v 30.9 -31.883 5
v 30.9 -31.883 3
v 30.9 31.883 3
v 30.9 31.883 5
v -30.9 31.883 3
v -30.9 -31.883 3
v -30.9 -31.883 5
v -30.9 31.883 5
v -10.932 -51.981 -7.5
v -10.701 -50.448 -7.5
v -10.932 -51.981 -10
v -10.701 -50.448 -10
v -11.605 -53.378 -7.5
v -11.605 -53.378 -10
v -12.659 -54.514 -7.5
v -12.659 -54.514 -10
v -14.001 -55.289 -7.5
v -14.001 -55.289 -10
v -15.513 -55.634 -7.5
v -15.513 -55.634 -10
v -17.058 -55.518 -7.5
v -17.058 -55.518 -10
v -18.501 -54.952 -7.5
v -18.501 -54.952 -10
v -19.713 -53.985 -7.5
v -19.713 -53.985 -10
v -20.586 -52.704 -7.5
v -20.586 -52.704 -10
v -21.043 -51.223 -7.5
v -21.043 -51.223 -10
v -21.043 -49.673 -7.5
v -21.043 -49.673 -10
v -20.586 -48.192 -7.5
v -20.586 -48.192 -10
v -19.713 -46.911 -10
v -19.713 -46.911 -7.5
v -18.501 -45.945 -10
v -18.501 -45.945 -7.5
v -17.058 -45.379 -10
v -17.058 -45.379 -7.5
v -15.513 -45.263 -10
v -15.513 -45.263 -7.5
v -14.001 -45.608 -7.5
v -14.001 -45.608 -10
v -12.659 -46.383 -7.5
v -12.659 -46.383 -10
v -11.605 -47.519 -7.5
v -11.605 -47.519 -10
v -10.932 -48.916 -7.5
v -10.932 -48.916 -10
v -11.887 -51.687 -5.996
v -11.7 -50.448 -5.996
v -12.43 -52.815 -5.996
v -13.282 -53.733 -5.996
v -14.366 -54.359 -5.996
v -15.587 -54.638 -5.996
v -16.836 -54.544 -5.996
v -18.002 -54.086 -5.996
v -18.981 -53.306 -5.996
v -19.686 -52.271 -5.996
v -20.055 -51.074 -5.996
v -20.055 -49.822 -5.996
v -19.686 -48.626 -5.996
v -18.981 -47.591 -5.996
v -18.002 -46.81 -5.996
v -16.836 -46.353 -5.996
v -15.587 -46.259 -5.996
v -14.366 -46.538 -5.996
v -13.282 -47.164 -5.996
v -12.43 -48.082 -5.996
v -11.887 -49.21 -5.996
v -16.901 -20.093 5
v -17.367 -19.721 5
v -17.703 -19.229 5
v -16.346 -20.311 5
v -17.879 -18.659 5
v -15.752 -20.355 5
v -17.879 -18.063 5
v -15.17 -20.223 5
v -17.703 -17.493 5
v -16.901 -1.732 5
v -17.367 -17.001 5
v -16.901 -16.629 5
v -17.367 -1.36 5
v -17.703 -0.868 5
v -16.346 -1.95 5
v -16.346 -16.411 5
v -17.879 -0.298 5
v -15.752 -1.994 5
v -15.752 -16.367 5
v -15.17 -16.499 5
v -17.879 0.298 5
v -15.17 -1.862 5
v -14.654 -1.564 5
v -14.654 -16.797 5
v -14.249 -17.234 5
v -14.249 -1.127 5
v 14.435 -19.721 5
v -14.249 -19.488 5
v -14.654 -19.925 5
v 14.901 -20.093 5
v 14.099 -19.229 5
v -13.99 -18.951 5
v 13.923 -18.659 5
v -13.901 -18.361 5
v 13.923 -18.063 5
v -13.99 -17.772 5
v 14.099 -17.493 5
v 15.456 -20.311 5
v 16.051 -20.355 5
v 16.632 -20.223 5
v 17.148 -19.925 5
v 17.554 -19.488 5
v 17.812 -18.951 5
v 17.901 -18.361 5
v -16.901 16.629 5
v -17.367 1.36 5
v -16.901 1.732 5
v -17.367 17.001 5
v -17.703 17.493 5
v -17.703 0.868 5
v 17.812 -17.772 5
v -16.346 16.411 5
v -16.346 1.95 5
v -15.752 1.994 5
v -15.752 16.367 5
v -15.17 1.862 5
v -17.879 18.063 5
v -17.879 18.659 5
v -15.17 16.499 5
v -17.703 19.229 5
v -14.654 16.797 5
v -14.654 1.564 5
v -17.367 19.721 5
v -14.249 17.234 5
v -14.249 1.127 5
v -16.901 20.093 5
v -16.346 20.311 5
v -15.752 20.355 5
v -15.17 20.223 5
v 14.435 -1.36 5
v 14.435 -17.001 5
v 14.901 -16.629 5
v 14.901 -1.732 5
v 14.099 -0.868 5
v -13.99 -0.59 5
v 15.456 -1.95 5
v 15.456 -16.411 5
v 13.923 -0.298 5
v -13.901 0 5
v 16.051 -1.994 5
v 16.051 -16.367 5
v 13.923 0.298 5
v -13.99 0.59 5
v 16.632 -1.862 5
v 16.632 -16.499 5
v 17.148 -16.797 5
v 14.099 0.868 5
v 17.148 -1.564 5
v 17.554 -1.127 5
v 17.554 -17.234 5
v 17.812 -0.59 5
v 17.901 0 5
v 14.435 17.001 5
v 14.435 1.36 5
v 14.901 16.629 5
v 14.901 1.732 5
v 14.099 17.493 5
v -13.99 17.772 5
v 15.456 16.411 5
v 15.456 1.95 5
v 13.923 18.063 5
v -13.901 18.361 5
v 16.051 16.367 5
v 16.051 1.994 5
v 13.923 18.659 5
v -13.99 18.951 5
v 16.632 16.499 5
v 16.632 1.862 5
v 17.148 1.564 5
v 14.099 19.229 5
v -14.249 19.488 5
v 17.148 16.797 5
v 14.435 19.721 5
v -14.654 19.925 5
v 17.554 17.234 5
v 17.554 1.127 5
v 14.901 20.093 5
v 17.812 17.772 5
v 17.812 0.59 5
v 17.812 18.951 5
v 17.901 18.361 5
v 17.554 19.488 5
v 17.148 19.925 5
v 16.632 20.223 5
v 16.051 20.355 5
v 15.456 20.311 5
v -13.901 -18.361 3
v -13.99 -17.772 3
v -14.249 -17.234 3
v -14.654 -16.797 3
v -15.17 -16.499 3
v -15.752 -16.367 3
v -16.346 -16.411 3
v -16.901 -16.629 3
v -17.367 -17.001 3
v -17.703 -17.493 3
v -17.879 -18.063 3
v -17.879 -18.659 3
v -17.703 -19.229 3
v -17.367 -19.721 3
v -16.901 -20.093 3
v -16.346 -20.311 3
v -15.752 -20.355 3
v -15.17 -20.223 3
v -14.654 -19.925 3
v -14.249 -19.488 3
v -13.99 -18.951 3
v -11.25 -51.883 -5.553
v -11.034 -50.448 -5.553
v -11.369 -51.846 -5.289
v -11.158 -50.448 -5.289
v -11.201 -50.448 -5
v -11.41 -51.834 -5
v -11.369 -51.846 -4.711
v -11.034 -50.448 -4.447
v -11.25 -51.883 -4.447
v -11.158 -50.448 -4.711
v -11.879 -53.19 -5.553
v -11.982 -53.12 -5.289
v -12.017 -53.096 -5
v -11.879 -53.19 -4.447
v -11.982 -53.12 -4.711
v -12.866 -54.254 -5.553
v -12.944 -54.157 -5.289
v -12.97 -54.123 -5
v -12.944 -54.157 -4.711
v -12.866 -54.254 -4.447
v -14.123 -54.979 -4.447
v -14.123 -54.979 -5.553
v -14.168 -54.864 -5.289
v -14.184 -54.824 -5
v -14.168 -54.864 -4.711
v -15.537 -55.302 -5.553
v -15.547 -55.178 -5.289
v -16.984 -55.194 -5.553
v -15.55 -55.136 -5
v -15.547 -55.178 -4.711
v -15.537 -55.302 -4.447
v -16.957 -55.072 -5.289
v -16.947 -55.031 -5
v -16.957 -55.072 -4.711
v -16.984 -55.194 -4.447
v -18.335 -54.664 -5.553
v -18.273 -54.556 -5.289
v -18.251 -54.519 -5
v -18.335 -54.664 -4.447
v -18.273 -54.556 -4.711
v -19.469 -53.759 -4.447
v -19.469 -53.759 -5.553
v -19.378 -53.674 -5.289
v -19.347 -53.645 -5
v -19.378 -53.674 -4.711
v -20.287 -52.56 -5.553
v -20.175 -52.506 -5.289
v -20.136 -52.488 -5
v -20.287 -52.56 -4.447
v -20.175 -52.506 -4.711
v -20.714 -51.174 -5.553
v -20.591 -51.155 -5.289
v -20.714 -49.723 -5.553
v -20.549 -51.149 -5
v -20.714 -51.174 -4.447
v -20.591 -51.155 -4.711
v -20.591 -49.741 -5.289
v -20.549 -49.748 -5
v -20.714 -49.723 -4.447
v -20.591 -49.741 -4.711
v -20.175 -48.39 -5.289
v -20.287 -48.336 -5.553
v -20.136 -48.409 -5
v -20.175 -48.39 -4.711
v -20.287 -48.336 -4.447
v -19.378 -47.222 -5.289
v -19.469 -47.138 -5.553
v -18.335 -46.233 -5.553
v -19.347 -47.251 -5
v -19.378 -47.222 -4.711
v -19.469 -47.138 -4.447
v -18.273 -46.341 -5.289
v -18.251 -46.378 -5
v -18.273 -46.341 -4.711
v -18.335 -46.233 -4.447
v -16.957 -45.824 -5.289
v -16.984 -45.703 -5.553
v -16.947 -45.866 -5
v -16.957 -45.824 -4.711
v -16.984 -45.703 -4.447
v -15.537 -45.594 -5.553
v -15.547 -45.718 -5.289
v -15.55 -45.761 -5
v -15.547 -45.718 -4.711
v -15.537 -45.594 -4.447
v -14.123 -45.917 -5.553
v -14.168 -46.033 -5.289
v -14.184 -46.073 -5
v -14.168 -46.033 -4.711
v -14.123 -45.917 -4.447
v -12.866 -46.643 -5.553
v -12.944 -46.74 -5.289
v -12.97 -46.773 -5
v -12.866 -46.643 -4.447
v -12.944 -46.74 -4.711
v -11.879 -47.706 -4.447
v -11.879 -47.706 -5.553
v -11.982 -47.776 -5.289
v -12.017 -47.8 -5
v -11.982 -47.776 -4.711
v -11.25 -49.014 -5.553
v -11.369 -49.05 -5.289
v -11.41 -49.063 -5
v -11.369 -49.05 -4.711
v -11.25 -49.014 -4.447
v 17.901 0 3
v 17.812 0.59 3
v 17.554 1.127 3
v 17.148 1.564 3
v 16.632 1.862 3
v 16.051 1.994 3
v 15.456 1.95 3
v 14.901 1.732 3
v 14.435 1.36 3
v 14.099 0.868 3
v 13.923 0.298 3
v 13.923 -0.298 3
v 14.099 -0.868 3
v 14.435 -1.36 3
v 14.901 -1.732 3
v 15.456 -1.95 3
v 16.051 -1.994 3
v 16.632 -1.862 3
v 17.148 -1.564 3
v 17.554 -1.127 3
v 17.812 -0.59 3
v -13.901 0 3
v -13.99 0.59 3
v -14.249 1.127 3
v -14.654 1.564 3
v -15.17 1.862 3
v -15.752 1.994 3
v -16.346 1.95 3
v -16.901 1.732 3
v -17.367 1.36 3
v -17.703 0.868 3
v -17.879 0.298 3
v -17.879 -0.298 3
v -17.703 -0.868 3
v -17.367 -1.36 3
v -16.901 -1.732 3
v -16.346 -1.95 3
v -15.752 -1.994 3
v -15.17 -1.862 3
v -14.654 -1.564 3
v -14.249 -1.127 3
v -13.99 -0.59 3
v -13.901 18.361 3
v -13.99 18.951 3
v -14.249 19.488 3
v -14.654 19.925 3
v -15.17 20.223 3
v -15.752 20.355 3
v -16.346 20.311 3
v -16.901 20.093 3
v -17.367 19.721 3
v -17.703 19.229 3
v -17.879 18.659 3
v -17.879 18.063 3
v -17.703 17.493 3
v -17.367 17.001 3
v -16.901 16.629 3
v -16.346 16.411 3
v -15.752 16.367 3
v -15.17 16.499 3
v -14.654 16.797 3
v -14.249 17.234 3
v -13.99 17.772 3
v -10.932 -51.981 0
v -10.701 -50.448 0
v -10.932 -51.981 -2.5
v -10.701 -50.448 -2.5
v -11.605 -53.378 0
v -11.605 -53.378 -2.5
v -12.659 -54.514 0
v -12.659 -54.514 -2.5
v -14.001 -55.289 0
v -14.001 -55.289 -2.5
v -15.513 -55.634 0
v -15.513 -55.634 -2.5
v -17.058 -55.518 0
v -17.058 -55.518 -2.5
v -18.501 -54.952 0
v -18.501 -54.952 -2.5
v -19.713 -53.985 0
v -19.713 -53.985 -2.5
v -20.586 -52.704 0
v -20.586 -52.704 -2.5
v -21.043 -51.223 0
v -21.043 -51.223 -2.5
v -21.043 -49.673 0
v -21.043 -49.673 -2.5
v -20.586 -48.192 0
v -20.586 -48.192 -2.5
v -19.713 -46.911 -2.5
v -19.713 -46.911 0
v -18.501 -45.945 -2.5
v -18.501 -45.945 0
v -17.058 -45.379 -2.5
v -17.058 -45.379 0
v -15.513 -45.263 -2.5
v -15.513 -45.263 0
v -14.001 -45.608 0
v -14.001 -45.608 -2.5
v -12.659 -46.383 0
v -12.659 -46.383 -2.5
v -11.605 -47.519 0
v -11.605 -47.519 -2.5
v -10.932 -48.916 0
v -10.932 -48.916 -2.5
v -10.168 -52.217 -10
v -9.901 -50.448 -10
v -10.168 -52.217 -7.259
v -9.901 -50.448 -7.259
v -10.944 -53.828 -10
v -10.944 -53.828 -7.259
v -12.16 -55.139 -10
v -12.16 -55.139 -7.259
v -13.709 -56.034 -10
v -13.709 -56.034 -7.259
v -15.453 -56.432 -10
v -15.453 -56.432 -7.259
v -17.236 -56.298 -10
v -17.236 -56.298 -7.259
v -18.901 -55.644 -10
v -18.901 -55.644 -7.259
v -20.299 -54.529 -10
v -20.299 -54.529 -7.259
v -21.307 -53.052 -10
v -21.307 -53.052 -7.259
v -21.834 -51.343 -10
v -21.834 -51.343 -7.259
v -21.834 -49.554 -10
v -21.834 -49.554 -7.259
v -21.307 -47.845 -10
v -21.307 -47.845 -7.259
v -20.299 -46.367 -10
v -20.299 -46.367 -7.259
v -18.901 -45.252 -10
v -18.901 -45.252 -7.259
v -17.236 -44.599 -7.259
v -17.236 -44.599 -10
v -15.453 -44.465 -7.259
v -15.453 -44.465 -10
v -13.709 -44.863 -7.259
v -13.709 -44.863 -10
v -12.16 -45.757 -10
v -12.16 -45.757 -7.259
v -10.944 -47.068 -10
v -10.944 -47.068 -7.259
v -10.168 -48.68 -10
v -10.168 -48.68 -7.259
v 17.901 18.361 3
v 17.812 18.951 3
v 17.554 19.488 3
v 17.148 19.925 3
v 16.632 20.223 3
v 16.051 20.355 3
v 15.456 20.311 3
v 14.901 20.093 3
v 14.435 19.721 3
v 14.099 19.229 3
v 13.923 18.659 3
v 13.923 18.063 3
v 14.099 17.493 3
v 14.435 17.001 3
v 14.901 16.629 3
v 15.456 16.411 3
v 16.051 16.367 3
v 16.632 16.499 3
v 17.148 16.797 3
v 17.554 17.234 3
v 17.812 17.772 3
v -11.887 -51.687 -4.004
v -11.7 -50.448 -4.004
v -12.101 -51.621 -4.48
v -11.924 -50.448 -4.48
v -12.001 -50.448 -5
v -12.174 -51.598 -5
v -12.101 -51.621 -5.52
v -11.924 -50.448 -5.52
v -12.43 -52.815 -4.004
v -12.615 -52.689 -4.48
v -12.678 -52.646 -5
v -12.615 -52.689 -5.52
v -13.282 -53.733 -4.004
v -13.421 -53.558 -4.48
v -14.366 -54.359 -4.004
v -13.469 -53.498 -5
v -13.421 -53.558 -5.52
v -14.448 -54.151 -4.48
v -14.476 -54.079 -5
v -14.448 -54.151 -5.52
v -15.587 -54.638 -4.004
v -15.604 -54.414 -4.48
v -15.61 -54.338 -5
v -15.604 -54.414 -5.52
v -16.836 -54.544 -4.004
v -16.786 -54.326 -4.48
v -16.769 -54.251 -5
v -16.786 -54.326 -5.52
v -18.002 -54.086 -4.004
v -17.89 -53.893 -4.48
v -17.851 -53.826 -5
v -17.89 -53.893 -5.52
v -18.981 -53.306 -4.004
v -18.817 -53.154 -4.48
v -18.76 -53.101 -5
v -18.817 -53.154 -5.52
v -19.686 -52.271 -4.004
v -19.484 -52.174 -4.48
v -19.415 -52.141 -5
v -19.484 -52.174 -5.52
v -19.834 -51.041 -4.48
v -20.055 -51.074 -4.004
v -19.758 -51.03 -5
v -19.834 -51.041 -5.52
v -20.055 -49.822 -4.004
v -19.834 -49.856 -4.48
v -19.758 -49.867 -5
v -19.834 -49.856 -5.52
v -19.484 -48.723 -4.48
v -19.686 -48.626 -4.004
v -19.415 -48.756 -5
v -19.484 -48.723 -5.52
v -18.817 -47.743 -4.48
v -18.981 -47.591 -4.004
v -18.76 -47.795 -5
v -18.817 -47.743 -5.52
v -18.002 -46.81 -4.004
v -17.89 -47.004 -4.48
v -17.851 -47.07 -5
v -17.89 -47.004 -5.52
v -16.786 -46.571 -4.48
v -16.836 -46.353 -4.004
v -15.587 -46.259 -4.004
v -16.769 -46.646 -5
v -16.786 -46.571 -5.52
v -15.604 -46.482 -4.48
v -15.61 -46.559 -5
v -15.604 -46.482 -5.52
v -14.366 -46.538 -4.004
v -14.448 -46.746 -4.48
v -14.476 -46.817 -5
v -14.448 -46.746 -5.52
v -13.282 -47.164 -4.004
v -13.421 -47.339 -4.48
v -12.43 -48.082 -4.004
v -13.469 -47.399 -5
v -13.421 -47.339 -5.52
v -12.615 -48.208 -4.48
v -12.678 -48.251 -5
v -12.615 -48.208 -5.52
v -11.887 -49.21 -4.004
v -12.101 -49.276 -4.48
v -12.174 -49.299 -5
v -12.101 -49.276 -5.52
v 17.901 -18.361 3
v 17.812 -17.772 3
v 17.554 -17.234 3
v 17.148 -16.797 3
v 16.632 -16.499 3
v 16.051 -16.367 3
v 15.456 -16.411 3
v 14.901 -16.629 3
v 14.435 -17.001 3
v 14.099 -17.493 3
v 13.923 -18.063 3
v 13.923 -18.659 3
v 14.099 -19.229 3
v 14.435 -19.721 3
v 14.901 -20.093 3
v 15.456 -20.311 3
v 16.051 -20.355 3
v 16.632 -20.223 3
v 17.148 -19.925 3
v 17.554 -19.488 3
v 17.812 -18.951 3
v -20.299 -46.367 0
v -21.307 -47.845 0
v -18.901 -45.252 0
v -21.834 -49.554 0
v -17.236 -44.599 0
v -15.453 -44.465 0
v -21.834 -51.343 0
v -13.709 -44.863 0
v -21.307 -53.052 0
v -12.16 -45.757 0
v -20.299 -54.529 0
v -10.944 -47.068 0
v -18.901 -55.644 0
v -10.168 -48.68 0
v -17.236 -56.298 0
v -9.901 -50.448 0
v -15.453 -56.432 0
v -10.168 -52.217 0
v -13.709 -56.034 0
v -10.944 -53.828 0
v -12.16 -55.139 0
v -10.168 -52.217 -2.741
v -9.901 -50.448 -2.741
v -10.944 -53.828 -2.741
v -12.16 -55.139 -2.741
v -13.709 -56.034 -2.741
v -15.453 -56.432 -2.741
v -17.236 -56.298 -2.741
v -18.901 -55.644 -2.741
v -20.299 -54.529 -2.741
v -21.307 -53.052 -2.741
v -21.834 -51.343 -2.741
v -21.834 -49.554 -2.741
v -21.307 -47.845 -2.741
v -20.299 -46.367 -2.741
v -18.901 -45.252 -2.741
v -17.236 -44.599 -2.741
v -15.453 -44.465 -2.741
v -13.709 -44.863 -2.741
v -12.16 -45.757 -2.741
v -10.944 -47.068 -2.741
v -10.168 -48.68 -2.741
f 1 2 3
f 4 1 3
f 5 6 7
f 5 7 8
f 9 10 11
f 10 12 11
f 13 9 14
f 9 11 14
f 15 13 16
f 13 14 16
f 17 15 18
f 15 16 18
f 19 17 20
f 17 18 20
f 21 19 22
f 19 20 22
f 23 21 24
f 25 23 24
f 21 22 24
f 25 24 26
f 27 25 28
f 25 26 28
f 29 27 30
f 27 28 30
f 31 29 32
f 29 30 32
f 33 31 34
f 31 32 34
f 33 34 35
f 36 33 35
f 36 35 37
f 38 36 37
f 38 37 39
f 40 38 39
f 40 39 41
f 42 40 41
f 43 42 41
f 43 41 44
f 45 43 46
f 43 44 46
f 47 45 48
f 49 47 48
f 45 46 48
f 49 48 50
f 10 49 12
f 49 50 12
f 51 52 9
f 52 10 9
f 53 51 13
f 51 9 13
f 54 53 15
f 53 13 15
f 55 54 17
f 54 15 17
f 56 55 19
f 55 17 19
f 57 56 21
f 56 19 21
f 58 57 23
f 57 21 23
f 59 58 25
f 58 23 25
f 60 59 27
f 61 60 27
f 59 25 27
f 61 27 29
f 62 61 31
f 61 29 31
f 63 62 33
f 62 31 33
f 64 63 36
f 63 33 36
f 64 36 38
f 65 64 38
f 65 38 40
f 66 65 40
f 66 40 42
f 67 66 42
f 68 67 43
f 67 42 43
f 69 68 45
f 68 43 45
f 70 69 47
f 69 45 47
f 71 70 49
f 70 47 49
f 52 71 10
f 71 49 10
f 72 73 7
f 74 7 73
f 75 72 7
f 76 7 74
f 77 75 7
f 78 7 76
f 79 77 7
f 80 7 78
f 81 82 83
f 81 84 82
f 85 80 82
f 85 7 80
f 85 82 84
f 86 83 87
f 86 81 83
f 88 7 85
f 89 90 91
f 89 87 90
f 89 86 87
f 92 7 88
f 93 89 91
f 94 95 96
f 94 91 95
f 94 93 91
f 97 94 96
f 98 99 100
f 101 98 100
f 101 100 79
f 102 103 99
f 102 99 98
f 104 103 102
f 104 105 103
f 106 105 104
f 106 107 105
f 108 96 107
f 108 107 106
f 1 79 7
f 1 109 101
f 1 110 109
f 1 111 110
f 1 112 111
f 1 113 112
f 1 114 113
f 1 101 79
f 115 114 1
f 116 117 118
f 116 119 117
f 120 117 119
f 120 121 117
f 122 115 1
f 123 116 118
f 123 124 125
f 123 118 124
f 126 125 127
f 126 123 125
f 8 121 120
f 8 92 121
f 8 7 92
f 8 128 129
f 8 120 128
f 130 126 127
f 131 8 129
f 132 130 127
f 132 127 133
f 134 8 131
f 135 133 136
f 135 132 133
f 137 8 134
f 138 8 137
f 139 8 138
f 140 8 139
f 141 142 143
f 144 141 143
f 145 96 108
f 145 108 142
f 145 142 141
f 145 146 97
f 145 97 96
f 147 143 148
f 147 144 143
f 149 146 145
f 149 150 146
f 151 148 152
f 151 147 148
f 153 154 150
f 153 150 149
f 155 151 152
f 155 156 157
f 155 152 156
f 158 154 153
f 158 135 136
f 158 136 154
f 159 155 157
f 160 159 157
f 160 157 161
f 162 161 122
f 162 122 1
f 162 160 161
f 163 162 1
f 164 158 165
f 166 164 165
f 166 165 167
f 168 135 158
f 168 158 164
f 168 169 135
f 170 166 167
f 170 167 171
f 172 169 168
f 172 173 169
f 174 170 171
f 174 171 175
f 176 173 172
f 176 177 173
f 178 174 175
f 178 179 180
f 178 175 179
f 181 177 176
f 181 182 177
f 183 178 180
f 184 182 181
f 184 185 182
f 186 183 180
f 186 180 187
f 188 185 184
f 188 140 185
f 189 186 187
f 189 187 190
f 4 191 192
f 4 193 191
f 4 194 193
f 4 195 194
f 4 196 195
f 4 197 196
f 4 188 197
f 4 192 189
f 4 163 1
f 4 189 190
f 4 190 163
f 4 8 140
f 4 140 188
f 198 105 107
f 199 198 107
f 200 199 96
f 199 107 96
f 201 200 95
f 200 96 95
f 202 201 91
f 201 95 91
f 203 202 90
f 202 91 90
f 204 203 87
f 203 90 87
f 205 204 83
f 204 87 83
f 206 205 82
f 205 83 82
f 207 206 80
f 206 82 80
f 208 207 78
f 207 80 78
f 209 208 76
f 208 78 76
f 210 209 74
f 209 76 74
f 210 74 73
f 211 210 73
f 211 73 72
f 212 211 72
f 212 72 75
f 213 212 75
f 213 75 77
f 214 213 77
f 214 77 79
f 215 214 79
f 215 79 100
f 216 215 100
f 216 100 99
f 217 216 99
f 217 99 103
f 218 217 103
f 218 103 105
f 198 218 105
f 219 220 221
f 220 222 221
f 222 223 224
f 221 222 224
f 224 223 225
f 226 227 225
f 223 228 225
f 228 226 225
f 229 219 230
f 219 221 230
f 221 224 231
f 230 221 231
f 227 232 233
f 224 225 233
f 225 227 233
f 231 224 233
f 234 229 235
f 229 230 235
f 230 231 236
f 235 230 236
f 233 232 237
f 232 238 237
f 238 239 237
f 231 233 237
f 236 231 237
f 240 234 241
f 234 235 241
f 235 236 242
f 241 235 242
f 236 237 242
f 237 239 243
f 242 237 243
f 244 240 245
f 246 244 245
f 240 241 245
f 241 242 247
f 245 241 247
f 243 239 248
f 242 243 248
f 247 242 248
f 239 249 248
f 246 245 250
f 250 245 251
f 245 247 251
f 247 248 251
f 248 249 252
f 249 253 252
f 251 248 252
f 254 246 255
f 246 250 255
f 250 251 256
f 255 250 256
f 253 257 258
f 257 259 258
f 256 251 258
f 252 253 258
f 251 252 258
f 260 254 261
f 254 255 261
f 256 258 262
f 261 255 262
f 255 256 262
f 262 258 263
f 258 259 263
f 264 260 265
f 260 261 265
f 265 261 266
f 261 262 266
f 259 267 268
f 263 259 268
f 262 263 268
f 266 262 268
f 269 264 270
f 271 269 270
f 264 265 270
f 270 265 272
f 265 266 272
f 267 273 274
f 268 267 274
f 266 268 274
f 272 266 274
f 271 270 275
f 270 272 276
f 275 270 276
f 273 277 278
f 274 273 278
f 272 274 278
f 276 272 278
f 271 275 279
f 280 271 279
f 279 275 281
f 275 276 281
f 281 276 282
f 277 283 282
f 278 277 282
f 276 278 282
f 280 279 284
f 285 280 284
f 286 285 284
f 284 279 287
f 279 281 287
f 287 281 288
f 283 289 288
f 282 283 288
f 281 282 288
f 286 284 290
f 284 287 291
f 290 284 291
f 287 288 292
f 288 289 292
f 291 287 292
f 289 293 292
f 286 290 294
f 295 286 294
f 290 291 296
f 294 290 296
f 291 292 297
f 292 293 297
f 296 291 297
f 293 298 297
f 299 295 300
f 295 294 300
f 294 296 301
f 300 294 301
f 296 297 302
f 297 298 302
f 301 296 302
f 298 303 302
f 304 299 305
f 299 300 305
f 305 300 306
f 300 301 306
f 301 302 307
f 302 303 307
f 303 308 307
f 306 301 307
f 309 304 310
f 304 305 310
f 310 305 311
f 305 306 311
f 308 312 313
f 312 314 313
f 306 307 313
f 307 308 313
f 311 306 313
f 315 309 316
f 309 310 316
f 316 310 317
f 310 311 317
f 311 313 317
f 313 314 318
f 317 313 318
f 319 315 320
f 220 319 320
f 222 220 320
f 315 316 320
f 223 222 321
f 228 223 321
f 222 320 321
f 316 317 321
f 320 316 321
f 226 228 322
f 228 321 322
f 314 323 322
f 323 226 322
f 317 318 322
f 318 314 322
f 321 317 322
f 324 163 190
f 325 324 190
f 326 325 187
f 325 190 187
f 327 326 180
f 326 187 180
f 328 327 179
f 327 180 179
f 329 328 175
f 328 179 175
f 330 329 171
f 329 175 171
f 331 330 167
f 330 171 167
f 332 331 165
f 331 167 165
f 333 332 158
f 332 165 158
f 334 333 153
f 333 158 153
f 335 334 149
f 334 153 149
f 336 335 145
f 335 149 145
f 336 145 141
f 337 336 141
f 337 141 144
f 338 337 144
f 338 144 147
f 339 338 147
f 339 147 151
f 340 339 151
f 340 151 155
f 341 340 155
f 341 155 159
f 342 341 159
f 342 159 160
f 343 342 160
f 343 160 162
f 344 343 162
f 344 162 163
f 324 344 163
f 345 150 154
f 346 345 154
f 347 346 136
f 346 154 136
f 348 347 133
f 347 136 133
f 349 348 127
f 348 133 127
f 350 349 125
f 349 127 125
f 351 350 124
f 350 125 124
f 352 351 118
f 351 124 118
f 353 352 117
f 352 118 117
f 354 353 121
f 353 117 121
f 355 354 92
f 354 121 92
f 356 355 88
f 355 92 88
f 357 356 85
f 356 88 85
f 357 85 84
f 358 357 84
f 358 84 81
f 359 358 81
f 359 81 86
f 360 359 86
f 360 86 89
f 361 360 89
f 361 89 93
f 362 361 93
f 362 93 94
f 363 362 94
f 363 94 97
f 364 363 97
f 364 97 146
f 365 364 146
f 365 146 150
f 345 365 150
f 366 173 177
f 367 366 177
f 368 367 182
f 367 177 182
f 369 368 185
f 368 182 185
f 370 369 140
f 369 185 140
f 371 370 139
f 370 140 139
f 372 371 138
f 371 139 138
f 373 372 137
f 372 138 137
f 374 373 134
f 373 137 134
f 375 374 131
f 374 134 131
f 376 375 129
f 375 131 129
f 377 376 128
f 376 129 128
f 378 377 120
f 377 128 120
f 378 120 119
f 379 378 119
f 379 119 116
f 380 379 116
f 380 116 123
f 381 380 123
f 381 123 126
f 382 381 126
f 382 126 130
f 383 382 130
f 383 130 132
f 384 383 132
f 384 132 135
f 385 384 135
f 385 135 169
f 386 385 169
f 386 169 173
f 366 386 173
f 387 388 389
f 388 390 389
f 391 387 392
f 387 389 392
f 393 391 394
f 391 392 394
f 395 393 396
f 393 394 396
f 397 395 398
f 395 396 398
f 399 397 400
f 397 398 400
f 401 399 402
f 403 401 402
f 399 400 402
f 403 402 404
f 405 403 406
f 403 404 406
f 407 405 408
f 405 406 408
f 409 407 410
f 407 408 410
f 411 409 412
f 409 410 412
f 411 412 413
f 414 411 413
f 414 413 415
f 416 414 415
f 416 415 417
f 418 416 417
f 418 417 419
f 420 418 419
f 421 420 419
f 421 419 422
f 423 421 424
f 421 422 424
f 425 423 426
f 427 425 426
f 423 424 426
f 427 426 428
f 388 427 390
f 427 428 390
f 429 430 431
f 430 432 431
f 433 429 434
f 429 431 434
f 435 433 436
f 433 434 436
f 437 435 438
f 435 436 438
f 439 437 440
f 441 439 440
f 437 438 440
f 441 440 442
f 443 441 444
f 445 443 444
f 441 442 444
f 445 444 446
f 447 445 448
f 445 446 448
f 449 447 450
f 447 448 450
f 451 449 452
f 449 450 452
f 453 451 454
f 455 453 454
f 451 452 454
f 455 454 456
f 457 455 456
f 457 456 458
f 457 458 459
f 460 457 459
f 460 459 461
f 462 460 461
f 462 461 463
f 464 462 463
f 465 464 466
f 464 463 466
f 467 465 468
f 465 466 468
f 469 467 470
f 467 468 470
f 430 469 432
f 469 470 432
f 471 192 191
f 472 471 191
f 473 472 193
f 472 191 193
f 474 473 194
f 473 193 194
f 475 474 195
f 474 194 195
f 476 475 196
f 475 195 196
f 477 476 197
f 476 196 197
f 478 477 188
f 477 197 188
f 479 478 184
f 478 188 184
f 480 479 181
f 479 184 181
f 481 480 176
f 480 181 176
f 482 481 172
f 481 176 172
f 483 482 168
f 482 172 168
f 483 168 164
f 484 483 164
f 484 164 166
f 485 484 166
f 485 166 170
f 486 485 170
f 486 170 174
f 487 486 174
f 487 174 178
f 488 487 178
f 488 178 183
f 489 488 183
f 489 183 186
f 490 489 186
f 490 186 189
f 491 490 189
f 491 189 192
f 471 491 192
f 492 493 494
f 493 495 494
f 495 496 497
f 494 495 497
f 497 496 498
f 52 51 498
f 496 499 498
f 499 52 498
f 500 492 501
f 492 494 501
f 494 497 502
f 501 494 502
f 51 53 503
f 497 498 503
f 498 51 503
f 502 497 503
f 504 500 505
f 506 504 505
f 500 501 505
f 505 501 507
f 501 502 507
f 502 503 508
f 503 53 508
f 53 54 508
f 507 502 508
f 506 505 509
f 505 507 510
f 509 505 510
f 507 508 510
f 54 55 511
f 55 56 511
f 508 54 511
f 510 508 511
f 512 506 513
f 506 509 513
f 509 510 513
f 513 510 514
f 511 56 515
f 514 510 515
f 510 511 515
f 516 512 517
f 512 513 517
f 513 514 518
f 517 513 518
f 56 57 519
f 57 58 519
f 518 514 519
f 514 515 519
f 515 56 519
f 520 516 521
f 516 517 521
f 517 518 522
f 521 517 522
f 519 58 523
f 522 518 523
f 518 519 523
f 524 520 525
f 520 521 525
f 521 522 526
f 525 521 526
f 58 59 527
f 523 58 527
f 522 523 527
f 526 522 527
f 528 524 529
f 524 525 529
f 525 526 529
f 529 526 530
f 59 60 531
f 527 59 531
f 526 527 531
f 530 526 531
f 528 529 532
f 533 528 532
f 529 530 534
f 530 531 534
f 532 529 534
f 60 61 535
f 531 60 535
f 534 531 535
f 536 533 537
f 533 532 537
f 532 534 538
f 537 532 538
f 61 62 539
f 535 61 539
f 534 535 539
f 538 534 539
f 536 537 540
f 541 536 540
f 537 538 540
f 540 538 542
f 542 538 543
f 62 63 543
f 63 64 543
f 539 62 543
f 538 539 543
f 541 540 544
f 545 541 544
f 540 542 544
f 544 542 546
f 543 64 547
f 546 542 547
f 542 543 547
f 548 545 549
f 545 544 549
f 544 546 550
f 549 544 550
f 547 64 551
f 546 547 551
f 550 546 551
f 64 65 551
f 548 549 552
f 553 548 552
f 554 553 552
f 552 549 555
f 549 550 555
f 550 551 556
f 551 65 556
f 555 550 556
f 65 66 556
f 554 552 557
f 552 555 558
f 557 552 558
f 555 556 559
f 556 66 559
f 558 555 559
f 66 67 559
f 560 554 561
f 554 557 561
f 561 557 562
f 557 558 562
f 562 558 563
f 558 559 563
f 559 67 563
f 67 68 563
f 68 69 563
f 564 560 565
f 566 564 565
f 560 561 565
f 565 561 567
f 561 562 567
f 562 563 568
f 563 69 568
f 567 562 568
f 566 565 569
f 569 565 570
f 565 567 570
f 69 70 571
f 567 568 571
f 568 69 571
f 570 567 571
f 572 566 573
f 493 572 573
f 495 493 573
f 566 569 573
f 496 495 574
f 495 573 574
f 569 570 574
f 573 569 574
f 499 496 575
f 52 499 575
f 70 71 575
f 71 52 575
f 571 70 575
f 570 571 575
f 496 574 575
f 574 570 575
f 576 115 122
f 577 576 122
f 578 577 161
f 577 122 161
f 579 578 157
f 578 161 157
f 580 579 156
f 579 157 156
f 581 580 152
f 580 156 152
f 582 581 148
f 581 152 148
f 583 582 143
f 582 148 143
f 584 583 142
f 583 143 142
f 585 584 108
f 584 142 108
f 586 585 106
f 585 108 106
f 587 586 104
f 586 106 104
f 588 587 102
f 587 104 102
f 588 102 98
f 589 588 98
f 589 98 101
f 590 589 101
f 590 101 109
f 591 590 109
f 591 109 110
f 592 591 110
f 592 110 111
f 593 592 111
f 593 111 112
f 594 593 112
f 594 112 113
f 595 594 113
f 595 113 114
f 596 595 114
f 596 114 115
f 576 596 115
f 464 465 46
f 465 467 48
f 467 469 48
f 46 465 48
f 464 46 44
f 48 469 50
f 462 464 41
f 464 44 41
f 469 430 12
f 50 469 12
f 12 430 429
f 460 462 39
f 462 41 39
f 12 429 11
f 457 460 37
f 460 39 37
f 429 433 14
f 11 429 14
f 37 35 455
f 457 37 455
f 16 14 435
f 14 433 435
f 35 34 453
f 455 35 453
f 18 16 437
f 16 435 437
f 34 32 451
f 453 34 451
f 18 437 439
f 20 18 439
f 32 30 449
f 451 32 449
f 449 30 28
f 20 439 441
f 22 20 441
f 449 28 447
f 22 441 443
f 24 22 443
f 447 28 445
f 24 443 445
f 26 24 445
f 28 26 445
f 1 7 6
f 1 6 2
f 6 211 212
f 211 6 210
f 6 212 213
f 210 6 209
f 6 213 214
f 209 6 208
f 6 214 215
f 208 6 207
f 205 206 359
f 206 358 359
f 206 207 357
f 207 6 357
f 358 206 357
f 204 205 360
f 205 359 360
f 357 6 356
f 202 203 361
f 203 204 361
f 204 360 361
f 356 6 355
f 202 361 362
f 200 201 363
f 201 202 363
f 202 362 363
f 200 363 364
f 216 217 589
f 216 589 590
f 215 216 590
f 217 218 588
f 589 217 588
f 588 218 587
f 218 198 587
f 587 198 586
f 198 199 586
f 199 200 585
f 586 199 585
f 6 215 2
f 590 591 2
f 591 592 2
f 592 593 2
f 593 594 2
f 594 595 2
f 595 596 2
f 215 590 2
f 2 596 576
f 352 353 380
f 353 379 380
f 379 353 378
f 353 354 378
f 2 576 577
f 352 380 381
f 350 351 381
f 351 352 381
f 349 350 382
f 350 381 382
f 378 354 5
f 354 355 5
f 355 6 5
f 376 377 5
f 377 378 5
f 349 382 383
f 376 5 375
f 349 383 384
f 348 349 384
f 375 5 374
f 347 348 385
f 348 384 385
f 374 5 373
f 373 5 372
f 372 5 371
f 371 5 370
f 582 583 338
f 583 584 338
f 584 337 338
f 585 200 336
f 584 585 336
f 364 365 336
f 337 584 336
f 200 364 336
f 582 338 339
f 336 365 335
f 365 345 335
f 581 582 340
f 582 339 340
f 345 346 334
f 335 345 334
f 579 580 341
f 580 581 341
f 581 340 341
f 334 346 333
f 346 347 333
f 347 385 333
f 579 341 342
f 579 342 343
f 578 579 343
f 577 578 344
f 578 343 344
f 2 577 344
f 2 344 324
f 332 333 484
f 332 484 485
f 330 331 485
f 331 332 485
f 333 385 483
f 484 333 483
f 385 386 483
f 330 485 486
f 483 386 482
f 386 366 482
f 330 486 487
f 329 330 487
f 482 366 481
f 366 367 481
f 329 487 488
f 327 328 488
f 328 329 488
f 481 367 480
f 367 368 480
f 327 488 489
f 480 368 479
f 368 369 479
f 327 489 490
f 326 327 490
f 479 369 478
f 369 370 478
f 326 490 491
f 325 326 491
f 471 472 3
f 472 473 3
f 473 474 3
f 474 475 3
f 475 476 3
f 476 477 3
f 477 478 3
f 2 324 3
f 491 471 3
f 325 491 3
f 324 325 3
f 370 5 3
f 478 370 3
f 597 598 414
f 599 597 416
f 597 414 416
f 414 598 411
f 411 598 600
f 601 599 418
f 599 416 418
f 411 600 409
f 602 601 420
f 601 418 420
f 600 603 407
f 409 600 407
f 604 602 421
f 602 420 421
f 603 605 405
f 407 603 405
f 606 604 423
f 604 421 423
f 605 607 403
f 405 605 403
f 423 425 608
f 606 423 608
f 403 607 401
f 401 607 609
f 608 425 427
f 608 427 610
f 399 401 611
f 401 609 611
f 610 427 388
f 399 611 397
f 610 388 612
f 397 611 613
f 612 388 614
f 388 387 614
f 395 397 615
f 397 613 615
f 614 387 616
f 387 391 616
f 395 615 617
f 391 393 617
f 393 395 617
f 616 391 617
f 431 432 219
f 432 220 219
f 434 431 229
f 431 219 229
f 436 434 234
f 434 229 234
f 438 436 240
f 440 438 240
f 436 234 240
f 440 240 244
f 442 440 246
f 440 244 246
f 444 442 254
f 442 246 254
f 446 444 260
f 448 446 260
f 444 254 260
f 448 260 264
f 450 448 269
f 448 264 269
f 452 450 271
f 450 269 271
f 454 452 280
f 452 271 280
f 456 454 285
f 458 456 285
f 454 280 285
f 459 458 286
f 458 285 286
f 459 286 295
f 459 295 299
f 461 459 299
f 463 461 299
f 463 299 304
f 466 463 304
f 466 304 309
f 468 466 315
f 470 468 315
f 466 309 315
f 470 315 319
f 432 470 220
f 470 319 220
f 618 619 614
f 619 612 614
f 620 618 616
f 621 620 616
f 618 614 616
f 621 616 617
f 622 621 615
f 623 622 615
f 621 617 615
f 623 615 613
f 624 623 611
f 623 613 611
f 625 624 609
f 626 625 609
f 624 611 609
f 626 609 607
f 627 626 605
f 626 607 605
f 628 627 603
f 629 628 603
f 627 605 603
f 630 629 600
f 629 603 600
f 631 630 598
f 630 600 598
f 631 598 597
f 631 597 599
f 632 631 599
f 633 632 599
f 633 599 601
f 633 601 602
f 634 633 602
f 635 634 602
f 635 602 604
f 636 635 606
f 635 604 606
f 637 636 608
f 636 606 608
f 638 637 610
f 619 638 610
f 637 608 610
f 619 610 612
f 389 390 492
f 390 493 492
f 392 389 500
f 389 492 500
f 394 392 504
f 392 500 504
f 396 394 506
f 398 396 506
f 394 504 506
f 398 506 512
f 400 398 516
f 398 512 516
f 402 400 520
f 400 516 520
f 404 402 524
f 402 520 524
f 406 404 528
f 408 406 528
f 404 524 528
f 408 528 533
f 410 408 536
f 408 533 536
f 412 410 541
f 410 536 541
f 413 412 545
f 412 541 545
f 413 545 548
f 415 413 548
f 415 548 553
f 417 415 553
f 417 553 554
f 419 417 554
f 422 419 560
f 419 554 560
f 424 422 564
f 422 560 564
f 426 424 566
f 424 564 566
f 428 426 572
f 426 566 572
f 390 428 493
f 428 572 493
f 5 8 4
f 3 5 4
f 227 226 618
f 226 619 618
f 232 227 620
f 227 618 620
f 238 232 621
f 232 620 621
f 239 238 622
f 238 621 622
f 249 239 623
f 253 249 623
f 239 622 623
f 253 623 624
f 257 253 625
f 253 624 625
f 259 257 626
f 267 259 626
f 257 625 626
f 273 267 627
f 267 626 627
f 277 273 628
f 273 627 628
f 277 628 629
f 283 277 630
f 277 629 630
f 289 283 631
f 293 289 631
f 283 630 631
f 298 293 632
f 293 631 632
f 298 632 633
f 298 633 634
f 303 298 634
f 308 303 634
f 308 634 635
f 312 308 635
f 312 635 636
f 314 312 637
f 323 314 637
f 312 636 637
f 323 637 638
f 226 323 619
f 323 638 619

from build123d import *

# Parameters (mm, degrees)
F0_W     = 61.8
F0_H     = 100.8965958967
F1_DEPTH = 5
F4_R     = 2
F4_W     = 61.8
F4_H     = 18.5648719378
F5_DEPTH = 25
F7_DEPTH = 3


with BuildPart() as f1:
    # F0 (on Top) → F1 (new body)
    with BuildSketch(Plane.XY):
        Rectangle(F0_W, F0_H)
    extrude(amount=F1_DEPTH)

    # F4 (on face) → F5 (cut)
    with BuildSketch(Plane.XY.offset(5)):
        with Locations((-15.9011339205, 0)):
            Circle(F4_R)
        with Locations((-15.9011339205, -18.3610478988)):
            Circle(F4_R)
        with Locations((15.9011339205, 18.3610478988)):
            Circle(F4_R)
        with Locations((15.9011339205, 0)):
            Circle(F4_R)
        with Locations((15.9011339205, -18.3610478988)):
            Circle(F4_R)
        with Locations((-15.9011339205, 18.3610478988)):
            Circle(F4_R)
        with Locations((0, 41.1658619795)):
            Rectangle(F4_W, F4_H)
        with Locations((0, -41.1658619795)):
            Rectangle(F4_W, F4_H)
    extrude(amount=-F5_DEPTH, mode=Mode.SUBTRACT)

    # F7 (cut): a face of the model
    f7_faces = [f1.faces().sort_by_distance(p)[0] for p in [
        (0, 0, 0),
    ]]
    extrude(f7_faces, amount=-F7_DEPTH, mode=Mode.SUBTRACT)


with BuildPart() as f3:
    # F2 (on face) → F3 (revolve)
    with BuildSketch(Plane.XZ.offset(50.4482979484)):
        with BuildLine():
            Line((-9.9011339205, 0), (-10.7011339205, 0))
            Line((-10.7011339205, 0), (-10.7011339205, -2.5))
            Line((-10.7011339205, -2.5), (-11.7001136063, -4.0041586889))
            ThreePointArc((-11.7001136063, -4.0041586889), (-12.0006803523, -5), (-11.7001136063, -5.9958413111))
            Line((-11.7001136063, -5.9958413111), (-10.7011339205, -7.5))
            Line((-10.7011339205, -7.5), (-10.7011339205, -10))
            Line((-10.7011339205, -10), (-9.9011339205, -10))
            Line((-9.9011339205, -10), (-9.9011339205, -7.2585424564))
            Line((-9.9011339205, -7.2585424564), (-11.0336988267, -5.5532451728))
            ThreePointArc((-11.0336988267, -5.5532451728), (-11.2006803523, -5), (-11.0336988267, -4.4467548272))
            Line((-11.0336988267, -4.4467548272), (-9.9011339205, -2.7414575436))
            Line((-9.9011339205, -2.7414575436), (-9.9011339205, 0))
        make_face()
    revolve(axis=Axis((-15.9011339205, -50.4482979484, -5), (0, 0, -1)))


solid = Compound([f1.part, f3.part])
